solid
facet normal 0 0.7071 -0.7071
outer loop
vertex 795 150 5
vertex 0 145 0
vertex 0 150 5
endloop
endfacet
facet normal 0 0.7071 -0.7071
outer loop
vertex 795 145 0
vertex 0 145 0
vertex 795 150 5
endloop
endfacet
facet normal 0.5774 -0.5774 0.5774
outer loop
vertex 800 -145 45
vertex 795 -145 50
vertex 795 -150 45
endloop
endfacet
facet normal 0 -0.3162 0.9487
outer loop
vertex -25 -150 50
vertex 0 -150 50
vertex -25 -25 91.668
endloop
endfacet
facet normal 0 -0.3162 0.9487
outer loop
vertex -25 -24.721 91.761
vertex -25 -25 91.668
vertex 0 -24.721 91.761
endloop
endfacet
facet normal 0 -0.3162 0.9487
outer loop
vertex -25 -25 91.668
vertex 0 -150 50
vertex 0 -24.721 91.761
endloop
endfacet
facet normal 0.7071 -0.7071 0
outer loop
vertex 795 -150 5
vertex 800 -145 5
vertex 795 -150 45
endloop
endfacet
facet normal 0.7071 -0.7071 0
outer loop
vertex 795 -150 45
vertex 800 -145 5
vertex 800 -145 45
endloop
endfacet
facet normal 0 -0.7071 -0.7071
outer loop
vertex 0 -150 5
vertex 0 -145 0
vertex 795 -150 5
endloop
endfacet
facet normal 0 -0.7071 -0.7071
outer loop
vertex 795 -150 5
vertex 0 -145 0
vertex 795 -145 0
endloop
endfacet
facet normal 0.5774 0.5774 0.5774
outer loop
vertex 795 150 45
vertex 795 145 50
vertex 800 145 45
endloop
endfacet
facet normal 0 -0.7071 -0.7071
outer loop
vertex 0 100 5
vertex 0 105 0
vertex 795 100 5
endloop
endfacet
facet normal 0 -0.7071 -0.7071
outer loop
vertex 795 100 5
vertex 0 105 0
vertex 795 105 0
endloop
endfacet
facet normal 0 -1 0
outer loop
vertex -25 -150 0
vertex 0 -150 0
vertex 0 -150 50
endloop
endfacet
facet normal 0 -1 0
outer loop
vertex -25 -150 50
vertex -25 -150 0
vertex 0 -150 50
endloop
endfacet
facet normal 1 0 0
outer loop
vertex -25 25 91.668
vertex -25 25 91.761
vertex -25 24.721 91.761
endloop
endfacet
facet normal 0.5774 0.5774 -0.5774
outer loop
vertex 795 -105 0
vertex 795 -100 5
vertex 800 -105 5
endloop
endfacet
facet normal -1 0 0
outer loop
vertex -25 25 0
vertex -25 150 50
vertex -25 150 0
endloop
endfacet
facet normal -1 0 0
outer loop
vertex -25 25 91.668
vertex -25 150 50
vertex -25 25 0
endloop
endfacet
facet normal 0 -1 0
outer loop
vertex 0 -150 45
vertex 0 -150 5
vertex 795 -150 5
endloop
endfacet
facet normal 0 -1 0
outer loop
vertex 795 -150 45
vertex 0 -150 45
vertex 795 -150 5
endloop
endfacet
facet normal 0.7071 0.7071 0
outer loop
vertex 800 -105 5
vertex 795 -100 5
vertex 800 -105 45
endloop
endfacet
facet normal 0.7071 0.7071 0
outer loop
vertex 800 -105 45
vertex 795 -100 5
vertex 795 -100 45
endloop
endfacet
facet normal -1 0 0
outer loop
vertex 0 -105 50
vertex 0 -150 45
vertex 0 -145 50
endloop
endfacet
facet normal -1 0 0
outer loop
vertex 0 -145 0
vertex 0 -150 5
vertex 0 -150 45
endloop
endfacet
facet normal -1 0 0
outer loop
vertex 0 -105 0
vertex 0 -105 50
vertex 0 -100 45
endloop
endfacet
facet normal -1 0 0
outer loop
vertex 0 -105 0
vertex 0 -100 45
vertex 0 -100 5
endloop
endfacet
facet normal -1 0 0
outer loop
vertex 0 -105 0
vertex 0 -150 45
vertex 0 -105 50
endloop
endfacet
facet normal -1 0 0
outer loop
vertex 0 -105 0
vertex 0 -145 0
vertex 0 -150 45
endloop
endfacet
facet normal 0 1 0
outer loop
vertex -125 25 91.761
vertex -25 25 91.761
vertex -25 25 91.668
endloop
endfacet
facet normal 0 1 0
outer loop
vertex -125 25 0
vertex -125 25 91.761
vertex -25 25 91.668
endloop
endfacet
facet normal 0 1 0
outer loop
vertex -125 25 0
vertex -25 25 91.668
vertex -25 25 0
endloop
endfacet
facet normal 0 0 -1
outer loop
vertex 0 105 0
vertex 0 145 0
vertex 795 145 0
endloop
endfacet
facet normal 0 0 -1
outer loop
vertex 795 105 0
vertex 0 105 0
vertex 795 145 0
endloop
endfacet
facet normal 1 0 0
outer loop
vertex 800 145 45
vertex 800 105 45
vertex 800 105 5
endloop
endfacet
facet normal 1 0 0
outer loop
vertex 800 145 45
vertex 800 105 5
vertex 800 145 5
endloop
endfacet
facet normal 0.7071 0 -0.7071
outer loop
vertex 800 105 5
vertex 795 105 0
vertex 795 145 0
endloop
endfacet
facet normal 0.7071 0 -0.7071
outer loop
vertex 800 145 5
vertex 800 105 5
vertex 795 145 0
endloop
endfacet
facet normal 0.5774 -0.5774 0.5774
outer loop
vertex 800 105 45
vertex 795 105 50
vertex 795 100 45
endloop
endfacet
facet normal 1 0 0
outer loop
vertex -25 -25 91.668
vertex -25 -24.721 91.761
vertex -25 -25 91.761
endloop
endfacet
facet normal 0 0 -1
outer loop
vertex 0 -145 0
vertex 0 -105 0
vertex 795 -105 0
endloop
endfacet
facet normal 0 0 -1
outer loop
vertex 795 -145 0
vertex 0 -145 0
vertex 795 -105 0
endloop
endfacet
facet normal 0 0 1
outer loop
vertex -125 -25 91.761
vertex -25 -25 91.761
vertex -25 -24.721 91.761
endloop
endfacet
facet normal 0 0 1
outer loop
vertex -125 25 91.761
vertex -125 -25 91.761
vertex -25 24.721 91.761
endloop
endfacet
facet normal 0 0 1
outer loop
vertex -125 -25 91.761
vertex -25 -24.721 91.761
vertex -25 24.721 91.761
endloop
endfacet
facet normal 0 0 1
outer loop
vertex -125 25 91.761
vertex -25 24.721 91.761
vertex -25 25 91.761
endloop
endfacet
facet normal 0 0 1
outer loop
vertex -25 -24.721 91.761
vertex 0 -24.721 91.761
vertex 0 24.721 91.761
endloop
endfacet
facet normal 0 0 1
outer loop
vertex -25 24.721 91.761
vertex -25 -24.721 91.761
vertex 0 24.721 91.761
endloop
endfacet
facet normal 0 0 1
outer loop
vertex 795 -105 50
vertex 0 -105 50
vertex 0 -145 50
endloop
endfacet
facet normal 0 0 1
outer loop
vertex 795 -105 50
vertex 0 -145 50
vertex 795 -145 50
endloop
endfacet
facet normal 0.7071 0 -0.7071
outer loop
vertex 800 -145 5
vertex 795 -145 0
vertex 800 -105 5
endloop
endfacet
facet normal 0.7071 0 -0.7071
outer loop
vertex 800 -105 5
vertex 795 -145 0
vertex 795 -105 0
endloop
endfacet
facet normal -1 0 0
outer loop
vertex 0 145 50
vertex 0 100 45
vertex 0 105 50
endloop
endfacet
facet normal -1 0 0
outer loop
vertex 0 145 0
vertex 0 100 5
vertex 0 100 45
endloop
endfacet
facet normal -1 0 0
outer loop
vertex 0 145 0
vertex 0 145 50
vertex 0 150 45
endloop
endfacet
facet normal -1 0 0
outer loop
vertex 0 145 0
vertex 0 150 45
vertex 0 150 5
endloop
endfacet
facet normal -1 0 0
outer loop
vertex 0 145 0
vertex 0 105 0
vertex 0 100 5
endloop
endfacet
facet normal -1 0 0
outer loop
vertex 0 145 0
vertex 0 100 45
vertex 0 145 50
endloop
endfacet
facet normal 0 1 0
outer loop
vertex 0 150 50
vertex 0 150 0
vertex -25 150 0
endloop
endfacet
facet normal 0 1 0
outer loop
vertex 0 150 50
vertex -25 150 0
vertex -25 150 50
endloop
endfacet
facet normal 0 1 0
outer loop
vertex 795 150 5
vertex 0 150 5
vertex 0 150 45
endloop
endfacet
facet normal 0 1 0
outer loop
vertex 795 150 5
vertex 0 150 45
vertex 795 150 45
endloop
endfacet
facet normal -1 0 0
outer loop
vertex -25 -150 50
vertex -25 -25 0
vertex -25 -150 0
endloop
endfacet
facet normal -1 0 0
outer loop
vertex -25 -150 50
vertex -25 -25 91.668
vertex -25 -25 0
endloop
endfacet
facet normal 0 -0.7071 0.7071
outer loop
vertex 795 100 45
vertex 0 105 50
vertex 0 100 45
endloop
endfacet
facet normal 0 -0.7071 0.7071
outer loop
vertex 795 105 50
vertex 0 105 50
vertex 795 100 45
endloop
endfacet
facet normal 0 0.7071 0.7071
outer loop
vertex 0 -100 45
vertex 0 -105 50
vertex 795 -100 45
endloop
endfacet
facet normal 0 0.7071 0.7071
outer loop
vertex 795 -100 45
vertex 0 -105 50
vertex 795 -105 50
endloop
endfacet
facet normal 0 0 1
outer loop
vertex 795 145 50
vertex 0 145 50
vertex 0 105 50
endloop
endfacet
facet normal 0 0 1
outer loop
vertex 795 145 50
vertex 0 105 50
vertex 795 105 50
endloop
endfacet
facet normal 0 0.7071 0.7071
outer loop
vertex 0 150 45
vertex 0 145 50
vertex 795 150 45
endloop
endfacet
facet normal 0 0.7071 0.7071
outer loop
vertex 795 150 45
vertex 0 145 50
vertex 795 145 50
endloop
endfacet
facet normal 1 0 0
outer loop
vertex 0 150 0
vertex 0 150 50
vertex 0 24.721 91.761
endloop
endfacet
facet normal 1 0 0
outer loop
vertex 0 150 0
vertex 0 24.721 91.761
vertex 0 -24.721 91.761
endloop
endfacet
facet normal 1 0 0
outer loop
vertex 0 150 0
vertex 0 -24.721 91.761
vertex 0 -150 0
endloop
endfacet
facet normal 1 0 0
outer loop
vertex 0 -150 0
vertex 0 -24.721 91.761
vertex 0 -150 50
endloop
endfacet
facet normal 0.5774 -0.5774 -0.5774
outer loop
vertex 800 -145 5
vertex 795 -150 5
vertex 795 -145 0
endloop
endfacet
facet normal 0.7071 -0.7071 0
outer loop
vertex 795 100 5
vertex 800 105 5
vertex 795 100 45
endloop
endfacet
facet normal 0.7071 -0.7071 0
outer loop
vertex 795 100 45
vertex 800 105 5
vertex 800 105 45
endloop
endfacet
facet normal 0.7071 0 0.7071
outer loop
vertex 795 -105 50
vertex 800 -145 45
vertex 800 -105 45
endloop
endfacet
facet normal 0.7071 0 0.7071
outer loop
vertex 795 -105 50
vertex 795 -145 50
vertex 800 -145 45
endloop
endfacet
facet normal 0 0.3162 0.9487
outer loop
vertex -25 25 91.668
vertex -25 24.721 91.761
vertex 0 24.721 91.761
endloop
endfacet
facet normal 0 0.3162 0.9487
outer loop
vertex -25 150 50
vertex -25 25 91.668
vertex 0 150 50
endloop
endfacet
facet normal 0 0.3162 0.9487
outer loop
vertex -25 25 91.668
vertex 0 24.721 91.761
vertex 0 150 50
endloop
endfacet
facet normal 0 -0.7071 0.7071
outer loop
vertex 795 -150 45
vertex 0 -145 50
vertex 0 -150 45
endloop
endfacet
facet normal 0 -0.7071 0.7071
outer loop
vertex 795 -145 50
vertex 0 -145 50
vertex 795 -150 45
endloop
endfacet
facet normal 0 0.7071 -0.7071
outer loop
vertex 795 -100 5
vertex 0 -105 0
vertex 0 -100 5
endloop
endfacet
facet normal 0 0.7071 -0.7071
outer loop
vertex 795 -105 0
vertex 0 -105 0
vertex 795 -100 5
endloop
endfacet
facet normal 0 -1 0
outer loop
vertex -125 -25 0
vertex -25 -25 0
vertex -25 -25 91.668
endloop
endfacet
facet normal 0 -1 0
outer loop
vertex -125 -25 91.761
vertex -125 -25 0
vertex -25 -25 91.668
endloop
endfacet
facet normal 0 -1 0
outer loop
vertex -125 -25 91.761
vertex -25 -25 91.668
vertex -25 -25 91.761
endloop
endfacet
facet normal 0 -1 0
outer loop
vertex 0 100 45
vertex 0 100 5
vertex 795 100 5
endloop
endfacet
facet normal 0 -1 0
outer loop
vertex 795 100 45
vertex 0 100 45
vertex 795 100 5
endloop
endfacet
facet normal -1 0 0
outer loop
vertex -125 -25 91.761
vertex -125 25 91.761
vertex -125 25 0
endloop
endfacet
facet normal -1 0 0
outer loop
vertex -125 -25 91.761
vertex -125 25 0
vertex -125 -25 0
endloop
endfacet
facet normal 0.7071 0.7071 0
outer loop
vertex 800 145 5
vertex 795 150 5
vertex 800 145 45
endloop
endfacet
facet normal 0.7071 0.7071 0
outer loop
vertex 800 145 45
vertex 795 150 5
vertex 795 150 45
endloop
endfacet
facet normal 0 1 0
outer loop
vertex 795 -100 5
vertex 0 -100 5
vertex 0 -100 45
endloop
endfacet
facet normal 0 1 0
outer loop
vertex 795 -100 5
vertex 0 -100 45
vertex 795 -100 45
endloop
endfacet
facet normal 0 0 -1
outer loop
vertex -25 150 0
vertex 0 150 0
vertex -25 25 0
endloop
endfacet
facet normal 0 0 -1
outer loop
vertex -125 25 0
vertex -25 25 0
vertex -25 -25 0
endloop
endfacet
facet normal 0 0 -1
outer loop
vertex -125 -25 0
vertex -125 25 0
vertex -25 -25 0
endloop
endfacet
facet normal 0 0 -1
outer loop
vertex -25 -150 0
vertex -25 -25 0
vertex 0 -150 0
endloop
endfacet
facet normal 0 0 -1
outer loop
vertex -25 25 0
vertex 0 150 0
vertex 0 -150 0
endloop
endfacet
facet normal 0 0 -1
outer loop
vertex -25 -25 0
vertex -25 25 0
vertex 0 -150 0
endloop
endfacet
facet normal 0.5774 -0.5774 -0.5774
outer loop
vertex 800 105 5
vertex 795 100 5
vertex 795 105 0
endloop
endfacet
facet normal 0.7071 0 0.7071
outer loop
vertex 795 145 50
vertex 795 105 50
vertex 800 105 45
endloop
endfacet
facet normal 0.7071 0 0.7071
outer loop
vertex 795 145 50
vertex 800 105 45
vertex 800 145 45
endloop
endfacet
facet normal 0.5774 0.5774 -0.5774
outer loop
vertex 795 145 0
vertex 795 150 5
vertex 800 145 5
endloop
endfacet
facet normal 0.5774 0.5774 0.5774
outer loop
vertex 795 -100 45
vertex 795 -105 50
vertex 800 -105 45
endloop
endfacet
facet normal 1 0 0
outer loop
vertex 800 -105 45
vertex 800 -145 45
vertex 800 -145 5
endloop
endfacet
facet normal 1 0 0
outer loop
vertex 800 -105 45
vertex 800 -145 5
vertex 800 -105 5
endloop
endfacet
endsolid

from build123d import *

# Parameters (mm, degrees)
F0_W     = 800
F0_H     = 50
F1_DEPTH = 50
F2_W     = 50
F2_H     = 50
F3_DEPTH = 25
F5_DEPTH = 100
F6_SIZE  = 5


with BuildPart() as f1:
    # F0 (on Top) → F1 (new body)
    with BuildSketch(Plane.XY):
        with Locations((400, -125)):
            Rectangle(F0_W, F0_H)
        with Locations((400, 125)):
            Rectangle(F0_W, F0_H)
    extrude(amount=F1_DEPTH)

    # F6
    f6_edges = [f1.edges().sort_by_distance(p)[0] for p in [
        (400, 100, 50),
        (400, -100, 50),
        (800, -125, 50),
        (800, 125, 50),
        (400, -150, 50),
        (400, 150, 50),
        (800, -150, 25),
        (800, -100, 25),
        (800, 100, 25),
        (800, 150, 25),
        (400, 100, 0),
        (400, -150, 0),
        (400, -100, 0),
        (400, 150, 0),
        (800, 125, 0),
        (800, -125, 0),
    ]]
    chamfer(f6_edges, length=F6_SIZE)


with BuildPart() as f3:
    # F2 (on face) → F3 (new body)
    with BuildSketch(Plane(origin=(0, 0, 0), x_dir=(0, -1, 0), z_dir=(-1, 0, 0))):
        Polygon((-100, 0), (0, 0), (150, 0), (150, 50), (24.721108, 91.761224), (0, 91.761224), (-24.721108, 91.761224), (-150, 50), (-100, 50), align=None)
        with Locations((-125, 25)):
            Rectangle(F2_W, F2_H)
    extrude(amount=F3_DEPTH)

    # F4 (on face) → F5 (join)
    with BuildSketch(Plane(origin=(-25, 0, 0), x_dir=(0, -1, 0), z_dir=(-1, 0, 0))):
        Polygon((-25, 91.761224), (-25, 91.668256), (-24.721108, 91.761224), align=None)
        Polygon((-25, 0), (0, 0), (25, 0), (25, 91.668256), (24.721108, 91.761224), (0, 91.761224), (-24.721108, 91.761224), (-25, 91.668256), align=None)
        Polygon((24.721108, 91.761224), (25, 91.668256), (25, 91.761224), align=None)
    extrude(amount=F5_DEPTH)


solid = Compound([f1.part, f3.part])
